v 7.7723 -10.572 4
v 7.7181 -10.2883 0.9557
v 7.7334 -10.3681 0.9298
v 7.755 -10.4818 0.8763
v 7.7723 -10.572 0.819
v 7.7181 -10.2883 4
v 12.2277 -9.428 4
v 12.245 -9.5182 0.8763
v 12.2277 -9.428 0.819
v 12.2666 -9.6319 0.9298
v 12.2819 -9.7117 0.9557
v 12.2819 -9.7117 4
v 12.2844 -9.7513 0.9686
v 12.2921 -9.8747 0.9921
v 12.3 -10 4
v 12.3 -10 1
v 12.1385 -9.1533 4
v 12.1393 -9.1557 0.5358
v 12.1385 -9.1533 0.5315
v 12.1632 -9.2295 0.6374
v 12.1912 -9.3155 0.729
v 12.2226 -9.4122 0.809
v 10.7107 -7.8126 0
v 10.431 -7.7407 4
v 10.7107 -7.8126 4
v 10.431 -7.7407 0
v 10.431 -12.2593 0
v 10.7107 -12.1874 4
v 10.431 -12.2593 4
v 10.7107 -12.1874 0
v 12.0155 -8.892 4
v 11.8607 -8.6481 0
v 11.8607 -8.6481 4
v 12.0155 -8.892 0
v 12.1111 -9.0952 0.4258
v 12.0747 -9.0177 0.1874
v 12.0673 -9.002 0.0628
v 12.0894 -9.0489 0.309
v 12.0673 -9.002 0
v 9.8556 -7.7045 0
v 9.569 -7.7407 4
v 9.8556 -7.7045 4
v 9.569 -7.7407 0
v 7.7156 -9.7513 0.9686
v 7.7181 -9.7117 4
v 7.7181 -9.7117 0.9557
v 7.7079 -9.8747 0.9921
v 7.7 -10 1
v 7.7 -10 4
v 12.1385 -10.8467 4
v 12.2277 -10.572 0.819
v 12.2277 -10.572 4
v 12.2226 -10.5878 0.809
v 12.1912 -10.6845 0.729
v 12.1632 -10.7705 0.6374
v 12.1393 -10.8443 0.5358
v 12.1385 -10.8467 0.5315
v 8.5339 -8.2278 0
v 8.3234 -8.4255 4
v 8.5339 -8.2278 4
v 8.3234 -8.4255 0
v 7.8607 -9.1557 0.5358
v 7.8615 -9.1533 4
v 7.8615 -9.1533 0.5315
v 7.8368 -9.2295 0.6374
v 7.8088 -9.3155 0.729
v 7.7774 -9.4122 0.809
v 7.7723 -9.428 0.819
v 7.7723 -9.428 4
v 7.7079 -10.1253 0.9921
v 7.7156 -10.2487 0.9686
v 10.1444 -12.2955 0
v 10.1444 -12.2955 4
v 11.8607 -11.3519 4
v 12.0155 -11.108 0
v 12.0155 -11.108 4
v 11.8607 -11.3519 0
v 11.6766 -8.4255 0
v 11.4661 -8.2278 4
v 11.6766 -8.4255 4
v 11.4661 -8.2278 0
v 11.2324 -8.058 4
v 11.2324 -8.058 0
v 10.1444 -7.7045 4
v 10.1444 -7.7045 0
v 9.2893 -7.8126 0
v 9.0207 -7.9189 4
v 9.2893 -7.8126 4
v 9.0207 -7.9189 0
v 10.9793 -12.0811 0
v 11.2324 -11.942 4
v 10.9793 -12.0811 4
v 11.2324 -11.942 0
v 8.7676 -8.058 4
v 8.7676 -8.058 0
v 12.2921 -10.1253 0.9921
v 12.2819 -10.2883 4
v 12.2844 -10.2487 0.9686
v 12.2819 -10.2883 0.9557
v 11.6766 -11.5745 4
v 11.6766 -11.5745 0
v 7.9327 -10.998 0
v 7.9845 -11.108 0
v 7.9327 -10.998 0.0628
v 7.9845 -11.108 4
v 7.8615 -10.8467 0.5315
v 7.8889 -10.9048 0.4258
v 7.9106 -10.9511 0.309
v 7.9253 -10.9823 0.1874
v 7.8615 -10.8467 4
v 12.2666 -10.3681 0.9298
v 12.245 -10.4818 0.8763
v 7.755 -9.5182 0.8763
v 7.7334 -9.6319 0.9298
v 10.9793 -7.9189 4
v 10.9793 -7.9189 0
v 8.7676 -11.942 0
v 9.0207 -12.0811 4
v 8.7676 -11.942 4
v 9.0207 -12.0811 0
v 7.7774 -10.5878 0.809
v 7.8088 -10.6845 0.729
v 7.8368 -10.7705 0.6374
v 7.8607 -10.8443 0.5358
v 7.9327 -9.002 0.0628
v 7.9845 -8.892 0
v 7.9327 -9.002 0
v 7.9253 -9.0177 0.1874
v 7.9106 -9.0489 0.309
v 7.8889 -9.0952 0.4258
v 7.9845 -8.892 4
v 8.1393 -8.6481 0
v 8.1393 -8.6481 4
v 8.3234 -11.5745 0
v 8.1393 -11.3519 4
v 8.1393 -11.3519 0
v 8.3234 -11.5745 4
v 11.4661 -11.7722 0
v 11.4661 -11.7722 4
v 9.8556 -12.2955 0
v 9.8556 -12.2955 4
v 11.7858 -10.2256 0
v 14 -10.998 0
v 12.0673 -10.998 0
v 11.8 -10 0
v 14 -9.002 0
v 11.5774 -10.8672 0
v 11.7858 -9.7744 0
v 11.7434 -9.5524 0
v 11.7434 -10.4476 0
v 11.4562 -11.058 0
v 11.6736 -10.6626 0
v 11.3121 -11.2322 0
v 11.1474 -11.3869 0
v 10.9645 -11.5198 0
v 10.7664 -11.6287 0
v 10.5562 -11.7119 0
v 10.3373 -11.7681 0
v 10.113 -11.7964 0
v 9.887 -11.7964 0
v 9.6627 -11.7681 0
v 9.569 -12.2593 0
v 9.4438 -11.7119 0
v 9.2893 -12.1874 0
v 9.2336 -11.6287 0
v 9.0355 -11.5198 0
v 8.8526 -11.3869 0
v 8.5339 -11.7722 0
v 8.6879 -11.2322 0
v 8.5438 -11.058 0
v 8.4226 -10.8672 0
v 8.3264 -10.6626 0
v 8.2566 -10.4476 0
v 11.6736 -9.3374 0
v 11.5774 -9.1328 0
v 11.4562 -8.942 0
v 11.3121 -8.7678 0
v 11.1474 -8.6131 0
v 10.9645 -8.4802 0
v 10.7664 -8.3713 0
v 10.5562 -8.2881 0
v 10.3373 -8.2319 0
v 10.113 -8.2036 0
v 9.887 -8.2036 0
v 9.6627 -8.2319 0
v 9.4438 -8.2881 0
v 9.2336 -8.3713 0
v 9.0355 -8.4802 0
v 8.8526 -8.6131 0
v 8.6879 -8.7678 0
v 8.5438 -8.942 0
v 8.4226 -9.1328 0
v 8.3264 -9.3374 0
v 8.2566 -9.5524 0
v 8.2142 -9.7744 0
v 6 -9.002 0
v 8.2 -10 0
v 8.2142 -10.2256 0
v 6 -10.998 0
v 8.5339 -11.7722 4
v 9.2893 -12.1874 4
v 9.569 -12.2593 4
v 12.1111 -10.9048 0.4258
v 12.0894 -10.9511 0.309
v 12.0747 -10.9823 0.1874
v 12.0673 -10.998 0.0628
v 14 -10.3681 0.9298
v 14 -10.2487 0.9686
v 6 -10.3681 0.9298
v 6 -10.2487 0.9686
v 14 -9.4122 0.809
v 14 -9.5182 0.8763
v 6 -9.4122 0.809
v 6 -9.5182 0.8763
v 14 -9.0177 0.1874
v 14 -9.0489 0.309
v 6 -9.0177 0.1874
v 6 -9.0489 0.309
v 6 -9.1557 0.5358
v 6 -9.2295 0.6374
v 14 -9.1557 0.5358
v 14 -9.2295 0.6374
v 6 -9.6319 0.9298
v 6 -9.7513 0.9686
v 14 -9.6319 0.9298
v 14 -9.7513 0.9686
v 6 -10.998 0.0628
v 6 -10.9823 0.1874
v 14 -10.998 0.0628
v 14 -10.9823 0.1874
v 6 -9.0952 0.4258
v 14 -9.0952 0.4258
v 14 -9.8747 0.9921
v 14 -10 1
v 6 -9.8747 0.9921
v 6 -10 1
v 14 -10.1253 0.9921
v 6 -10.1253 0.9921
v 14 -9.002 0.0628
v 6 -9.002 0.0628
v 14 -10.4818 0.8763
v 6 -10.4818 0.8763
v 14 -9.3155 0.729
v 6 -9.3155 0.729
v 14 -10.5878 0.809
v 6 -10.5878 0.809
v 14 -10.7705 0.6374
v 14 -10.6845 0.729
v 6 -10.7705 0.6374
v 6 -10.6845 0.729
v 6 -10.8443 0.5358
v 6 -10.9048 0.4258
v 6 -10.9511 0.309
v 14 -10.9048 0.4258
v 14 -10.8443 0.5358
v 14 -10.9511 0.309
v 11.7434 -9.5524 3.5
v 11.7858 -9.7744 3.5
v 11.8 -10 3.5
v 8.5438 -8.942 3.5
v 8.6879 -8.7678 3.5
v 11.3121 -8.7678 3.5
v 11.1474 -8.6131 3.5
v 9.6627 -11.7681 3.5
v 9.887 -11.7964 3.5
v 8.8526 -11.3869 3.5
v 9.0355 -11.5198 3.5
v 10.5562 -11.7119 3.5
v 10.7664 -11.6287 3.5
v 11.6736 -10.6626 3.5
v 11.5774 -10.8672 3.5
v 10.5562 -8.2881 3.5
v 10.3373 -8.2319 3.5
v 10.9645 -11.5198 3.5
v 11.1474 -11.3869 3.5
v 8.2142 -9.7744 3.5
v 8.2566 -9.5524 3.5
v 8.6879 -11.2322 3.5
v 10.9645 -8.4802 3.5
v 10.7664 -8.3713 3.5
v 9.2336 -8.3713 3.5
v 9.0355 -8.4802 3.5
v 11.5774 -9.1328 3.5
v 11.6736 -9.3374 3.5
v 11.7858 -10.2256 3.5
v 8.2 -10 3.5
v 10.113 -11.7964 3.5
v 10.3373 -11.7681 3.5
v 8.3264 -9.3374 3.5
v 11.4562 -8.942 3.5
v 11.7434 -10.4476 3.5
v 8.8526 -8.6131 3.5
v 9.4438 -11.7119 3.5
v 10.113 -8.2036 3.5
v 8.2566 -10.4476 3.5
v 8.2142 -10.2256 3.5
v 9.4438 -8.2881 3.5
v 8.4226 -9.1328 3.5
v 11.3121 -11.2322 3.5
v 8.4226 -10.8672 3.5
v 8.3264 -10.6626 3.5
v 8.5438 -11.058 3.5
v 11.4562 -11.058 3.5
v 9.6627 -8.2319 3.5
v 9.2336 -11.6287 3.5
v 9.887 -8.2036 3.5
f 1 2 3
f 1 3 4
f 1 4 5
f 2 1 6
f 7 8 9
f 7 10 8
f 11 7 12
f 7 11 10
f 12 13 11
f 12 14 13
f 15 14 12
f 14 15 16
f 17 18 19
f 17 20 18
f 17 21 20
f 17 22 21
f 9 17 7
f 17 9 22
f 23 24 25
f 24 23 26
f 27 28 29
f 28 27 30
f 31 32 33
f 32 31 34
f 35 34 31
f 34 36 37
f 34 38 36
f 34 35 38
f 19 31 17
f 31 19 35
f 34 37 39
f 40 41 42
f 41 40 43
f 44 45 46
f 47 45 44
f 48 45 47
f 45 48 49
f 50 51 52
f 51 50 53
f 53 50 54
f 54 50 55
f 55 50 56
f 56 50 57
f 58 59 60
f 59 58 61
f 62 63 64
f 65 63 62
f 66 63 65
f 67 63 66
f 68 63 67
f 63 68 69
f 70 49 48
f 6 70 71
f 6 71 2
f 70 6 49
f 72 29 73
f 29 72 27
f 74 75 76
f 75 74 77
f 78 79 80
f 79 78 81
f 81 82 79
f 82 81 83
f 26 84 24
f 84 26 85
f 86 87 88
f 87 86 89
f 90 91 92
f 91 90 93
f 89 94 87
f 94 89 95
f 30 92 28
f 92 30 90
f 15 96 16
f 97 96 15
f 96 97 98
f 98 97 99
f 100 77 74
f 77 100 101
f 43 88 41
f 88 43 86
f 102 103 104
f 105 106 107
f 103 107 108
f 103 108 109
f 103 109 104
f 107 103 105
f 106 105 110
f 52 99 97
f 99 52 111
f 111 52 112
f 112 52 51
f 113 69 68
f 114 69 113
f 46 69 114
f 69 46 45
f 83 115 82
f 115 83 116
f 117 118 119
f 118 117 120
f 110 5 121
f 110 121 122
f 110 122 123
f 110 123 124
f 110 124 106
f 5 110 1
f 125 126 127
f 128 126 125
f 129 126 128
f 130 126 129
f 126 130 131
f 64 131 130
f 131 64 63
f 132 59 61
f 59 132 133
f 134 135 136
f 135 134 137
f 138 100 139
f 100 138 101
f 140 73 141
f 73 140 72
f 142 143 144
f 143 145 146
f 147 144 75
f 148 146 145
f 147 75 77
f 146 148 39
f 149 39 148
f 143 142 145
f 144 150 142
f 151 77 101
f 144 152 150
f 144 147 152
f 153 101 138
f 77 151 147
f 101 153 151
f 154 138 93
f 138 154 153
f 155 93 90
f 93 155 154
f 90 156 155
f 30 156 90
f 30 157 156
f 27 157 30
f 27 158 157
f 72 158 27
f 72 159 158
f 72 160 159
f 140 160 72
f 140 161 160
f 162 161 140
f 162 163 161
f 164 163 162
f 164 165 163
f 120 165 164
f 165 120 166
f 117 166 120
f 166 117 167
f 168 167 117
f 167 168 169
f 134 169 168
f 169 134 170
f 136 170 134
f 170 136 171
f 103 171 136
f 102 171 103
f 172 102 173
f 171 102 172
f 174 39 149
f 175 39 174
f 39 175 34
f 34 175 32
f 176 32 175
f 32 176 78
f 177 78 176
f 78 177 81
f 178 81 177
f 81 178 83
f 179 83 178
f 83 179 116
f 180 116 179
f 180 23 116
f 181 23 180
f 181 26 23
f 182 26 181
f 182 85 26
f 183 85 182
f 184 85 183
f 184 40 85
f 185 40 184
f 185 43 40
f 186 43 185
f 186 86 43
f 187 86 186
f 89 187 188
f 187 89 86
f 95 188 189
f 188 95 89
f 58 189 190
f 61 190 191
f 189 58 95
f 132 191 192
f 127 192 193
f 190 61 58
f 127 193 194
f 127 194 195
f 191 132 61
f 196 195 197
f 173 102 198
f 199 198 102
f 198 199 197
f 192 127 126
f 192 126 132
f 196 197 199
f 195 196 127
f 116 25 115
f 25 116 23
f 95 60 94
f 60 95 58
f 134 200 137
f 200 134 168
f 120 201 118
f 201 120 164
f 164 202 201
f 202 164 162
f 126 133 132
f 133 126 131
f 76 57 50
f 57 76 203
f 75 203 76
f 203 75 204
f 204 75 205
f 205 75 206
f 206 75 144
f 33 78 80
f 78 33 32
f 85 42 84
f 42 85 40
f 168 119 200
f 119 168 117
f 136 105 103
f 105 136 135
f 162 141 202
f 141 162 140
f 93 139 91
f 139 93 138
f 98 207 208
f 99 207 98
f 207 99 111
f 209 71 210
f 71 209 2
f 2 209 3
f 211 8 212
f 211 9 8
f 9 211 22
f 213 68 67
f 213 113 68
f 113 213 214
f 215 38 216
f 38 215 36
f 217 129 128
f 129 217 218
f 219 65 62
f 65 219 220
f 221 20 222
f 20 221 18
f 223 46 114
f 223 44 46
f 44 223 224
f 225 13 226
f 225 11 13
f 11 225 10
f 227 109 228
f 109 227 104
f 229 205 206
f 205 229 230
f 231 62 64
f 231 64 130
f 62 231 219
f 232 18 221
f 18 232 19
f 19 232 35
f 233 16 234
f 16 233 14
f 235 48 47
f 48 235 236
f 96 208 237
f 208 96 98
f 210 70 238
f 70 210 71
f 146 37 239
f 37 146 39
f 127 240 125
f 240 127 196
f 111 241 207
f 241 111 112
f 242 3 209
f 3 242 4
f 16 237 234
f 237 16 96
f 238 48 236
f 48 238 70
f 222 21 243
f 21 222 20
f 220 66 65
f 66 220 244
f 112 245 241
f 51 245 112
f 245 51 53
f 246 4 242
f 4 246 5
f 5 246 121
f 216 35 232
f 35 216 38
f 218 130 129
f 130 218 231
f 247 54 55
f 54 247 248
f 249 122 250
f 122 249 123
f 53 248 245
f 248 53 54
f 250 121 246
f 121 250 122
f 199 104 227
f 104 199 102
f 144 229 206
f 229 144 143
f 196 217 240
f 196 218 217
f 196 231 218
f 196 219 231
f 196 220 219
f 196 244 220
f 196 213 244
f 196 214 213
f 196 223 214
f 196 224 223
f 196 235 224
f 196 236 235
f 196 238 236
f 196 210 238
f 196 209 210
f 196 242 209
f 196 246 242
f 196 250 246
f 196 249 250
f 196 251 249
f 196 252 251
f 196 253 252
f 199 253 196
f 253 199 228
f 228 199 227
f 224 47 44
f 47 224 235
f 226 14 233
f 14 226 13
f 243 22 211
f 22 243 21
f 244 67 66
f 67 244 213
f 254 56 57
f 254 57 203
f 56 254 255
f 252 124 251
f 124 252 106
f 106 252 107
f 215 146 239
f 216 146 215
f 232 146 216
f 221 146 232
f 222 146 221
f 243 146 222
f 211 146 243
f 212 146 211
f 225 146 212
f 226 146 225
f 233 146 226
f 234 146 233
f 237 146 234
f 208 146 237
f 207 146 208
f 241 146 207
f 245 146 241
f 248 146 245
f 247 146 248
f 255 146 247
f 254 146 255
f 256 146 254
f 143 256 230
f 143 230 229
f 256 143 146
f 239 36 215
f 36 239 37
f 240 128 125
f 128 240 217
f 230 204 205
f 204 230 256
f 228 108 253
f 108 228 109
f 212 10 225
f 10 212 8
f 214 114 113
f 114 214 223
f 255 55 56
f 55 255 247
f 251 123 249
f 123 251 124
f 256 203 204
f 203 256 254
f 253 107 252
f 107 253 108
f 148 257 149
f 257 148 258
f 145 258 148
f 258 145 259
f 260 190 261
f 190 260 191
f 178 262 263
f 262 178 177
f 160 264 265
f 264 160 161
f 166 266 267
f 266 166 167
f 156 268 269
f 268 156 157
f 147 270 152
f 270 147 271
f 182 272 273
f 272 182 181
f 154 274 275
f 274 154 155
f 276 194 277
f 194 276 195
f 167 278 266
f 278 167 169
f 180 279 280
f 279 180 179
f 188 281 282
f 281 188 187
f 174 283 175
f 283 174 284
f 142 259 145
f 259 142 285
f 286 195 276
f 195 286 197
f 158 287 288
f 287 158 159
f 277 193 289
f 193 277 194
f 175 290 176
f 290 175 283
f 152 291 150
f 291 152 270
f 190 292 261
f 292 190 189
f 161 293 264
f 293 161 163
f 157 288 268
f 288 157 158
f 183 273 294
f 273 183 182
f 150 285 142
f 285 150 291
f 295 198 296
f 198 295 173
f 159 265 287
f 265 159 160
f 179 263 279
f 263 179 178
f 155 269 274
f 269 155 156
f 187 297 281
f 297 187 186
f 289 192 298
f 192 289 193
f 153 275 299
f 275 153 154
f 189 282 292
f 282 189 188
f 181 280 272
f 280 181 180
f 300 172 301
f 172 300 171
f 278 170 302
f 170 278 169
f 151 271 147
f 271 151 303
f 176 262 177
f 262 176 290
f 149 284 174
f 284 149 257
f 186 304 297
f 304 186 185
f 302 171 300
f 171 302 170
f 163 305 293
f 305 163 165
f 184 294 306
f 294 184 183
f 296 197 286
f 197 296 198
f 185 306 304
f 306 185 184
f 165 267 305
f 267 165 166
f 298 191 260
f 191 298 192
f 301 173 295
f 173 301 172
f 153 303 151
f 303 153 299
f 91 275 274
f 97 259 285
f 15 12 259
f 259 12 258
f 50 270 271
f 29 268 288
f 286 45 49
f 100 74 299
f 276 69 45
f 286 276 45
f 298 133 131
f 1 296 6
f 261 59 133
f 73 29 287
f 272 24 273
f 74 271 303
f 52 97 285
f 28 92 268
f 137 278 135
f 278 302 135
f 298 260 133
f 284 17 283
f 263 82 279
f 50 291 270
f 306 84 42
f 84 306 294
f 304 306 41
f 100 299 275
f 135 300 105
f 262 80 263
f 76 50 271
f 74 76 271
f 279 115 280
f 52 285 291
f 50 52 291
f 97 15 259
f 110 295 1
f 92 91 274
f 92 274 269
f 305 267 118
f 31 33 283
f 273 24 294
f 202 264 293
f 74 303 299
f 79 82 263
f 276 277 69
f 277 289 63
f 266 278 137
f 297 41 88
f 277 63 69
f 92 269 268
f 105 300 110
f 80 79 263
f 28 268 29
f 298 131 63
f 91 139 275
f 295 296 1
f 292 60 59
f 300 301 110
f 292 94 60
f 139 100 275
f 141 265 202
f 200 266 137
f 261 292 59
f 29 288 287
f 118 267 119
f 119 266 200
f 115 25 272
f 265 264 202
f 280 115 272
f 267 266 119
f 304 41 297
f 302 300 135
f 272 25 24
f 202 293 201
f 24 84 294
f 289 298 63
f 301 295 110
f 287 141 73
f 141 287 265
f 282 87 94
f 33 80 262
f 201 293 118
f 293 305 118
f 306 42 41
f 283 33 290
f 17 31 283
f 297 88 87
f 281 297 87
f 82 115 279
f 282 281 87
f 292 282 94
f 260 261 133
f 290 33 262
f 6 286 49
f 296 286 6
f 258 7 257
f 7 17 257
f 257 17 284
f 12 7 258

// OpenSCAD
T = 1;

em_d = 20; // electromagnet
em_l = 30;

b_w = em_d + 2*T; // block
b_l = em_l + T + 7;
b_h = em_d + 2*T + 5;

r_d = 3.6; // 1/8" dowel
r_l = 150;



translate([10,-10,0]) {
    difference() {
        union() {
            cylinder(4,r_d/2+.5,r_d/2+.5, $fn=50);
            rotate([0,90,0]) translate([0,0,-4]) cylinder(8,1,1, $fn=50);
        }
        cylinder(5,r_d/2,r_d/2, $fn=50);
        translate([0,0,3.5]) cylinder(.5,r_d/2,r_d/2+.5, $fn=50);
        translate([-10,-10,-20]) cube([20,20,20]);
    }
}
